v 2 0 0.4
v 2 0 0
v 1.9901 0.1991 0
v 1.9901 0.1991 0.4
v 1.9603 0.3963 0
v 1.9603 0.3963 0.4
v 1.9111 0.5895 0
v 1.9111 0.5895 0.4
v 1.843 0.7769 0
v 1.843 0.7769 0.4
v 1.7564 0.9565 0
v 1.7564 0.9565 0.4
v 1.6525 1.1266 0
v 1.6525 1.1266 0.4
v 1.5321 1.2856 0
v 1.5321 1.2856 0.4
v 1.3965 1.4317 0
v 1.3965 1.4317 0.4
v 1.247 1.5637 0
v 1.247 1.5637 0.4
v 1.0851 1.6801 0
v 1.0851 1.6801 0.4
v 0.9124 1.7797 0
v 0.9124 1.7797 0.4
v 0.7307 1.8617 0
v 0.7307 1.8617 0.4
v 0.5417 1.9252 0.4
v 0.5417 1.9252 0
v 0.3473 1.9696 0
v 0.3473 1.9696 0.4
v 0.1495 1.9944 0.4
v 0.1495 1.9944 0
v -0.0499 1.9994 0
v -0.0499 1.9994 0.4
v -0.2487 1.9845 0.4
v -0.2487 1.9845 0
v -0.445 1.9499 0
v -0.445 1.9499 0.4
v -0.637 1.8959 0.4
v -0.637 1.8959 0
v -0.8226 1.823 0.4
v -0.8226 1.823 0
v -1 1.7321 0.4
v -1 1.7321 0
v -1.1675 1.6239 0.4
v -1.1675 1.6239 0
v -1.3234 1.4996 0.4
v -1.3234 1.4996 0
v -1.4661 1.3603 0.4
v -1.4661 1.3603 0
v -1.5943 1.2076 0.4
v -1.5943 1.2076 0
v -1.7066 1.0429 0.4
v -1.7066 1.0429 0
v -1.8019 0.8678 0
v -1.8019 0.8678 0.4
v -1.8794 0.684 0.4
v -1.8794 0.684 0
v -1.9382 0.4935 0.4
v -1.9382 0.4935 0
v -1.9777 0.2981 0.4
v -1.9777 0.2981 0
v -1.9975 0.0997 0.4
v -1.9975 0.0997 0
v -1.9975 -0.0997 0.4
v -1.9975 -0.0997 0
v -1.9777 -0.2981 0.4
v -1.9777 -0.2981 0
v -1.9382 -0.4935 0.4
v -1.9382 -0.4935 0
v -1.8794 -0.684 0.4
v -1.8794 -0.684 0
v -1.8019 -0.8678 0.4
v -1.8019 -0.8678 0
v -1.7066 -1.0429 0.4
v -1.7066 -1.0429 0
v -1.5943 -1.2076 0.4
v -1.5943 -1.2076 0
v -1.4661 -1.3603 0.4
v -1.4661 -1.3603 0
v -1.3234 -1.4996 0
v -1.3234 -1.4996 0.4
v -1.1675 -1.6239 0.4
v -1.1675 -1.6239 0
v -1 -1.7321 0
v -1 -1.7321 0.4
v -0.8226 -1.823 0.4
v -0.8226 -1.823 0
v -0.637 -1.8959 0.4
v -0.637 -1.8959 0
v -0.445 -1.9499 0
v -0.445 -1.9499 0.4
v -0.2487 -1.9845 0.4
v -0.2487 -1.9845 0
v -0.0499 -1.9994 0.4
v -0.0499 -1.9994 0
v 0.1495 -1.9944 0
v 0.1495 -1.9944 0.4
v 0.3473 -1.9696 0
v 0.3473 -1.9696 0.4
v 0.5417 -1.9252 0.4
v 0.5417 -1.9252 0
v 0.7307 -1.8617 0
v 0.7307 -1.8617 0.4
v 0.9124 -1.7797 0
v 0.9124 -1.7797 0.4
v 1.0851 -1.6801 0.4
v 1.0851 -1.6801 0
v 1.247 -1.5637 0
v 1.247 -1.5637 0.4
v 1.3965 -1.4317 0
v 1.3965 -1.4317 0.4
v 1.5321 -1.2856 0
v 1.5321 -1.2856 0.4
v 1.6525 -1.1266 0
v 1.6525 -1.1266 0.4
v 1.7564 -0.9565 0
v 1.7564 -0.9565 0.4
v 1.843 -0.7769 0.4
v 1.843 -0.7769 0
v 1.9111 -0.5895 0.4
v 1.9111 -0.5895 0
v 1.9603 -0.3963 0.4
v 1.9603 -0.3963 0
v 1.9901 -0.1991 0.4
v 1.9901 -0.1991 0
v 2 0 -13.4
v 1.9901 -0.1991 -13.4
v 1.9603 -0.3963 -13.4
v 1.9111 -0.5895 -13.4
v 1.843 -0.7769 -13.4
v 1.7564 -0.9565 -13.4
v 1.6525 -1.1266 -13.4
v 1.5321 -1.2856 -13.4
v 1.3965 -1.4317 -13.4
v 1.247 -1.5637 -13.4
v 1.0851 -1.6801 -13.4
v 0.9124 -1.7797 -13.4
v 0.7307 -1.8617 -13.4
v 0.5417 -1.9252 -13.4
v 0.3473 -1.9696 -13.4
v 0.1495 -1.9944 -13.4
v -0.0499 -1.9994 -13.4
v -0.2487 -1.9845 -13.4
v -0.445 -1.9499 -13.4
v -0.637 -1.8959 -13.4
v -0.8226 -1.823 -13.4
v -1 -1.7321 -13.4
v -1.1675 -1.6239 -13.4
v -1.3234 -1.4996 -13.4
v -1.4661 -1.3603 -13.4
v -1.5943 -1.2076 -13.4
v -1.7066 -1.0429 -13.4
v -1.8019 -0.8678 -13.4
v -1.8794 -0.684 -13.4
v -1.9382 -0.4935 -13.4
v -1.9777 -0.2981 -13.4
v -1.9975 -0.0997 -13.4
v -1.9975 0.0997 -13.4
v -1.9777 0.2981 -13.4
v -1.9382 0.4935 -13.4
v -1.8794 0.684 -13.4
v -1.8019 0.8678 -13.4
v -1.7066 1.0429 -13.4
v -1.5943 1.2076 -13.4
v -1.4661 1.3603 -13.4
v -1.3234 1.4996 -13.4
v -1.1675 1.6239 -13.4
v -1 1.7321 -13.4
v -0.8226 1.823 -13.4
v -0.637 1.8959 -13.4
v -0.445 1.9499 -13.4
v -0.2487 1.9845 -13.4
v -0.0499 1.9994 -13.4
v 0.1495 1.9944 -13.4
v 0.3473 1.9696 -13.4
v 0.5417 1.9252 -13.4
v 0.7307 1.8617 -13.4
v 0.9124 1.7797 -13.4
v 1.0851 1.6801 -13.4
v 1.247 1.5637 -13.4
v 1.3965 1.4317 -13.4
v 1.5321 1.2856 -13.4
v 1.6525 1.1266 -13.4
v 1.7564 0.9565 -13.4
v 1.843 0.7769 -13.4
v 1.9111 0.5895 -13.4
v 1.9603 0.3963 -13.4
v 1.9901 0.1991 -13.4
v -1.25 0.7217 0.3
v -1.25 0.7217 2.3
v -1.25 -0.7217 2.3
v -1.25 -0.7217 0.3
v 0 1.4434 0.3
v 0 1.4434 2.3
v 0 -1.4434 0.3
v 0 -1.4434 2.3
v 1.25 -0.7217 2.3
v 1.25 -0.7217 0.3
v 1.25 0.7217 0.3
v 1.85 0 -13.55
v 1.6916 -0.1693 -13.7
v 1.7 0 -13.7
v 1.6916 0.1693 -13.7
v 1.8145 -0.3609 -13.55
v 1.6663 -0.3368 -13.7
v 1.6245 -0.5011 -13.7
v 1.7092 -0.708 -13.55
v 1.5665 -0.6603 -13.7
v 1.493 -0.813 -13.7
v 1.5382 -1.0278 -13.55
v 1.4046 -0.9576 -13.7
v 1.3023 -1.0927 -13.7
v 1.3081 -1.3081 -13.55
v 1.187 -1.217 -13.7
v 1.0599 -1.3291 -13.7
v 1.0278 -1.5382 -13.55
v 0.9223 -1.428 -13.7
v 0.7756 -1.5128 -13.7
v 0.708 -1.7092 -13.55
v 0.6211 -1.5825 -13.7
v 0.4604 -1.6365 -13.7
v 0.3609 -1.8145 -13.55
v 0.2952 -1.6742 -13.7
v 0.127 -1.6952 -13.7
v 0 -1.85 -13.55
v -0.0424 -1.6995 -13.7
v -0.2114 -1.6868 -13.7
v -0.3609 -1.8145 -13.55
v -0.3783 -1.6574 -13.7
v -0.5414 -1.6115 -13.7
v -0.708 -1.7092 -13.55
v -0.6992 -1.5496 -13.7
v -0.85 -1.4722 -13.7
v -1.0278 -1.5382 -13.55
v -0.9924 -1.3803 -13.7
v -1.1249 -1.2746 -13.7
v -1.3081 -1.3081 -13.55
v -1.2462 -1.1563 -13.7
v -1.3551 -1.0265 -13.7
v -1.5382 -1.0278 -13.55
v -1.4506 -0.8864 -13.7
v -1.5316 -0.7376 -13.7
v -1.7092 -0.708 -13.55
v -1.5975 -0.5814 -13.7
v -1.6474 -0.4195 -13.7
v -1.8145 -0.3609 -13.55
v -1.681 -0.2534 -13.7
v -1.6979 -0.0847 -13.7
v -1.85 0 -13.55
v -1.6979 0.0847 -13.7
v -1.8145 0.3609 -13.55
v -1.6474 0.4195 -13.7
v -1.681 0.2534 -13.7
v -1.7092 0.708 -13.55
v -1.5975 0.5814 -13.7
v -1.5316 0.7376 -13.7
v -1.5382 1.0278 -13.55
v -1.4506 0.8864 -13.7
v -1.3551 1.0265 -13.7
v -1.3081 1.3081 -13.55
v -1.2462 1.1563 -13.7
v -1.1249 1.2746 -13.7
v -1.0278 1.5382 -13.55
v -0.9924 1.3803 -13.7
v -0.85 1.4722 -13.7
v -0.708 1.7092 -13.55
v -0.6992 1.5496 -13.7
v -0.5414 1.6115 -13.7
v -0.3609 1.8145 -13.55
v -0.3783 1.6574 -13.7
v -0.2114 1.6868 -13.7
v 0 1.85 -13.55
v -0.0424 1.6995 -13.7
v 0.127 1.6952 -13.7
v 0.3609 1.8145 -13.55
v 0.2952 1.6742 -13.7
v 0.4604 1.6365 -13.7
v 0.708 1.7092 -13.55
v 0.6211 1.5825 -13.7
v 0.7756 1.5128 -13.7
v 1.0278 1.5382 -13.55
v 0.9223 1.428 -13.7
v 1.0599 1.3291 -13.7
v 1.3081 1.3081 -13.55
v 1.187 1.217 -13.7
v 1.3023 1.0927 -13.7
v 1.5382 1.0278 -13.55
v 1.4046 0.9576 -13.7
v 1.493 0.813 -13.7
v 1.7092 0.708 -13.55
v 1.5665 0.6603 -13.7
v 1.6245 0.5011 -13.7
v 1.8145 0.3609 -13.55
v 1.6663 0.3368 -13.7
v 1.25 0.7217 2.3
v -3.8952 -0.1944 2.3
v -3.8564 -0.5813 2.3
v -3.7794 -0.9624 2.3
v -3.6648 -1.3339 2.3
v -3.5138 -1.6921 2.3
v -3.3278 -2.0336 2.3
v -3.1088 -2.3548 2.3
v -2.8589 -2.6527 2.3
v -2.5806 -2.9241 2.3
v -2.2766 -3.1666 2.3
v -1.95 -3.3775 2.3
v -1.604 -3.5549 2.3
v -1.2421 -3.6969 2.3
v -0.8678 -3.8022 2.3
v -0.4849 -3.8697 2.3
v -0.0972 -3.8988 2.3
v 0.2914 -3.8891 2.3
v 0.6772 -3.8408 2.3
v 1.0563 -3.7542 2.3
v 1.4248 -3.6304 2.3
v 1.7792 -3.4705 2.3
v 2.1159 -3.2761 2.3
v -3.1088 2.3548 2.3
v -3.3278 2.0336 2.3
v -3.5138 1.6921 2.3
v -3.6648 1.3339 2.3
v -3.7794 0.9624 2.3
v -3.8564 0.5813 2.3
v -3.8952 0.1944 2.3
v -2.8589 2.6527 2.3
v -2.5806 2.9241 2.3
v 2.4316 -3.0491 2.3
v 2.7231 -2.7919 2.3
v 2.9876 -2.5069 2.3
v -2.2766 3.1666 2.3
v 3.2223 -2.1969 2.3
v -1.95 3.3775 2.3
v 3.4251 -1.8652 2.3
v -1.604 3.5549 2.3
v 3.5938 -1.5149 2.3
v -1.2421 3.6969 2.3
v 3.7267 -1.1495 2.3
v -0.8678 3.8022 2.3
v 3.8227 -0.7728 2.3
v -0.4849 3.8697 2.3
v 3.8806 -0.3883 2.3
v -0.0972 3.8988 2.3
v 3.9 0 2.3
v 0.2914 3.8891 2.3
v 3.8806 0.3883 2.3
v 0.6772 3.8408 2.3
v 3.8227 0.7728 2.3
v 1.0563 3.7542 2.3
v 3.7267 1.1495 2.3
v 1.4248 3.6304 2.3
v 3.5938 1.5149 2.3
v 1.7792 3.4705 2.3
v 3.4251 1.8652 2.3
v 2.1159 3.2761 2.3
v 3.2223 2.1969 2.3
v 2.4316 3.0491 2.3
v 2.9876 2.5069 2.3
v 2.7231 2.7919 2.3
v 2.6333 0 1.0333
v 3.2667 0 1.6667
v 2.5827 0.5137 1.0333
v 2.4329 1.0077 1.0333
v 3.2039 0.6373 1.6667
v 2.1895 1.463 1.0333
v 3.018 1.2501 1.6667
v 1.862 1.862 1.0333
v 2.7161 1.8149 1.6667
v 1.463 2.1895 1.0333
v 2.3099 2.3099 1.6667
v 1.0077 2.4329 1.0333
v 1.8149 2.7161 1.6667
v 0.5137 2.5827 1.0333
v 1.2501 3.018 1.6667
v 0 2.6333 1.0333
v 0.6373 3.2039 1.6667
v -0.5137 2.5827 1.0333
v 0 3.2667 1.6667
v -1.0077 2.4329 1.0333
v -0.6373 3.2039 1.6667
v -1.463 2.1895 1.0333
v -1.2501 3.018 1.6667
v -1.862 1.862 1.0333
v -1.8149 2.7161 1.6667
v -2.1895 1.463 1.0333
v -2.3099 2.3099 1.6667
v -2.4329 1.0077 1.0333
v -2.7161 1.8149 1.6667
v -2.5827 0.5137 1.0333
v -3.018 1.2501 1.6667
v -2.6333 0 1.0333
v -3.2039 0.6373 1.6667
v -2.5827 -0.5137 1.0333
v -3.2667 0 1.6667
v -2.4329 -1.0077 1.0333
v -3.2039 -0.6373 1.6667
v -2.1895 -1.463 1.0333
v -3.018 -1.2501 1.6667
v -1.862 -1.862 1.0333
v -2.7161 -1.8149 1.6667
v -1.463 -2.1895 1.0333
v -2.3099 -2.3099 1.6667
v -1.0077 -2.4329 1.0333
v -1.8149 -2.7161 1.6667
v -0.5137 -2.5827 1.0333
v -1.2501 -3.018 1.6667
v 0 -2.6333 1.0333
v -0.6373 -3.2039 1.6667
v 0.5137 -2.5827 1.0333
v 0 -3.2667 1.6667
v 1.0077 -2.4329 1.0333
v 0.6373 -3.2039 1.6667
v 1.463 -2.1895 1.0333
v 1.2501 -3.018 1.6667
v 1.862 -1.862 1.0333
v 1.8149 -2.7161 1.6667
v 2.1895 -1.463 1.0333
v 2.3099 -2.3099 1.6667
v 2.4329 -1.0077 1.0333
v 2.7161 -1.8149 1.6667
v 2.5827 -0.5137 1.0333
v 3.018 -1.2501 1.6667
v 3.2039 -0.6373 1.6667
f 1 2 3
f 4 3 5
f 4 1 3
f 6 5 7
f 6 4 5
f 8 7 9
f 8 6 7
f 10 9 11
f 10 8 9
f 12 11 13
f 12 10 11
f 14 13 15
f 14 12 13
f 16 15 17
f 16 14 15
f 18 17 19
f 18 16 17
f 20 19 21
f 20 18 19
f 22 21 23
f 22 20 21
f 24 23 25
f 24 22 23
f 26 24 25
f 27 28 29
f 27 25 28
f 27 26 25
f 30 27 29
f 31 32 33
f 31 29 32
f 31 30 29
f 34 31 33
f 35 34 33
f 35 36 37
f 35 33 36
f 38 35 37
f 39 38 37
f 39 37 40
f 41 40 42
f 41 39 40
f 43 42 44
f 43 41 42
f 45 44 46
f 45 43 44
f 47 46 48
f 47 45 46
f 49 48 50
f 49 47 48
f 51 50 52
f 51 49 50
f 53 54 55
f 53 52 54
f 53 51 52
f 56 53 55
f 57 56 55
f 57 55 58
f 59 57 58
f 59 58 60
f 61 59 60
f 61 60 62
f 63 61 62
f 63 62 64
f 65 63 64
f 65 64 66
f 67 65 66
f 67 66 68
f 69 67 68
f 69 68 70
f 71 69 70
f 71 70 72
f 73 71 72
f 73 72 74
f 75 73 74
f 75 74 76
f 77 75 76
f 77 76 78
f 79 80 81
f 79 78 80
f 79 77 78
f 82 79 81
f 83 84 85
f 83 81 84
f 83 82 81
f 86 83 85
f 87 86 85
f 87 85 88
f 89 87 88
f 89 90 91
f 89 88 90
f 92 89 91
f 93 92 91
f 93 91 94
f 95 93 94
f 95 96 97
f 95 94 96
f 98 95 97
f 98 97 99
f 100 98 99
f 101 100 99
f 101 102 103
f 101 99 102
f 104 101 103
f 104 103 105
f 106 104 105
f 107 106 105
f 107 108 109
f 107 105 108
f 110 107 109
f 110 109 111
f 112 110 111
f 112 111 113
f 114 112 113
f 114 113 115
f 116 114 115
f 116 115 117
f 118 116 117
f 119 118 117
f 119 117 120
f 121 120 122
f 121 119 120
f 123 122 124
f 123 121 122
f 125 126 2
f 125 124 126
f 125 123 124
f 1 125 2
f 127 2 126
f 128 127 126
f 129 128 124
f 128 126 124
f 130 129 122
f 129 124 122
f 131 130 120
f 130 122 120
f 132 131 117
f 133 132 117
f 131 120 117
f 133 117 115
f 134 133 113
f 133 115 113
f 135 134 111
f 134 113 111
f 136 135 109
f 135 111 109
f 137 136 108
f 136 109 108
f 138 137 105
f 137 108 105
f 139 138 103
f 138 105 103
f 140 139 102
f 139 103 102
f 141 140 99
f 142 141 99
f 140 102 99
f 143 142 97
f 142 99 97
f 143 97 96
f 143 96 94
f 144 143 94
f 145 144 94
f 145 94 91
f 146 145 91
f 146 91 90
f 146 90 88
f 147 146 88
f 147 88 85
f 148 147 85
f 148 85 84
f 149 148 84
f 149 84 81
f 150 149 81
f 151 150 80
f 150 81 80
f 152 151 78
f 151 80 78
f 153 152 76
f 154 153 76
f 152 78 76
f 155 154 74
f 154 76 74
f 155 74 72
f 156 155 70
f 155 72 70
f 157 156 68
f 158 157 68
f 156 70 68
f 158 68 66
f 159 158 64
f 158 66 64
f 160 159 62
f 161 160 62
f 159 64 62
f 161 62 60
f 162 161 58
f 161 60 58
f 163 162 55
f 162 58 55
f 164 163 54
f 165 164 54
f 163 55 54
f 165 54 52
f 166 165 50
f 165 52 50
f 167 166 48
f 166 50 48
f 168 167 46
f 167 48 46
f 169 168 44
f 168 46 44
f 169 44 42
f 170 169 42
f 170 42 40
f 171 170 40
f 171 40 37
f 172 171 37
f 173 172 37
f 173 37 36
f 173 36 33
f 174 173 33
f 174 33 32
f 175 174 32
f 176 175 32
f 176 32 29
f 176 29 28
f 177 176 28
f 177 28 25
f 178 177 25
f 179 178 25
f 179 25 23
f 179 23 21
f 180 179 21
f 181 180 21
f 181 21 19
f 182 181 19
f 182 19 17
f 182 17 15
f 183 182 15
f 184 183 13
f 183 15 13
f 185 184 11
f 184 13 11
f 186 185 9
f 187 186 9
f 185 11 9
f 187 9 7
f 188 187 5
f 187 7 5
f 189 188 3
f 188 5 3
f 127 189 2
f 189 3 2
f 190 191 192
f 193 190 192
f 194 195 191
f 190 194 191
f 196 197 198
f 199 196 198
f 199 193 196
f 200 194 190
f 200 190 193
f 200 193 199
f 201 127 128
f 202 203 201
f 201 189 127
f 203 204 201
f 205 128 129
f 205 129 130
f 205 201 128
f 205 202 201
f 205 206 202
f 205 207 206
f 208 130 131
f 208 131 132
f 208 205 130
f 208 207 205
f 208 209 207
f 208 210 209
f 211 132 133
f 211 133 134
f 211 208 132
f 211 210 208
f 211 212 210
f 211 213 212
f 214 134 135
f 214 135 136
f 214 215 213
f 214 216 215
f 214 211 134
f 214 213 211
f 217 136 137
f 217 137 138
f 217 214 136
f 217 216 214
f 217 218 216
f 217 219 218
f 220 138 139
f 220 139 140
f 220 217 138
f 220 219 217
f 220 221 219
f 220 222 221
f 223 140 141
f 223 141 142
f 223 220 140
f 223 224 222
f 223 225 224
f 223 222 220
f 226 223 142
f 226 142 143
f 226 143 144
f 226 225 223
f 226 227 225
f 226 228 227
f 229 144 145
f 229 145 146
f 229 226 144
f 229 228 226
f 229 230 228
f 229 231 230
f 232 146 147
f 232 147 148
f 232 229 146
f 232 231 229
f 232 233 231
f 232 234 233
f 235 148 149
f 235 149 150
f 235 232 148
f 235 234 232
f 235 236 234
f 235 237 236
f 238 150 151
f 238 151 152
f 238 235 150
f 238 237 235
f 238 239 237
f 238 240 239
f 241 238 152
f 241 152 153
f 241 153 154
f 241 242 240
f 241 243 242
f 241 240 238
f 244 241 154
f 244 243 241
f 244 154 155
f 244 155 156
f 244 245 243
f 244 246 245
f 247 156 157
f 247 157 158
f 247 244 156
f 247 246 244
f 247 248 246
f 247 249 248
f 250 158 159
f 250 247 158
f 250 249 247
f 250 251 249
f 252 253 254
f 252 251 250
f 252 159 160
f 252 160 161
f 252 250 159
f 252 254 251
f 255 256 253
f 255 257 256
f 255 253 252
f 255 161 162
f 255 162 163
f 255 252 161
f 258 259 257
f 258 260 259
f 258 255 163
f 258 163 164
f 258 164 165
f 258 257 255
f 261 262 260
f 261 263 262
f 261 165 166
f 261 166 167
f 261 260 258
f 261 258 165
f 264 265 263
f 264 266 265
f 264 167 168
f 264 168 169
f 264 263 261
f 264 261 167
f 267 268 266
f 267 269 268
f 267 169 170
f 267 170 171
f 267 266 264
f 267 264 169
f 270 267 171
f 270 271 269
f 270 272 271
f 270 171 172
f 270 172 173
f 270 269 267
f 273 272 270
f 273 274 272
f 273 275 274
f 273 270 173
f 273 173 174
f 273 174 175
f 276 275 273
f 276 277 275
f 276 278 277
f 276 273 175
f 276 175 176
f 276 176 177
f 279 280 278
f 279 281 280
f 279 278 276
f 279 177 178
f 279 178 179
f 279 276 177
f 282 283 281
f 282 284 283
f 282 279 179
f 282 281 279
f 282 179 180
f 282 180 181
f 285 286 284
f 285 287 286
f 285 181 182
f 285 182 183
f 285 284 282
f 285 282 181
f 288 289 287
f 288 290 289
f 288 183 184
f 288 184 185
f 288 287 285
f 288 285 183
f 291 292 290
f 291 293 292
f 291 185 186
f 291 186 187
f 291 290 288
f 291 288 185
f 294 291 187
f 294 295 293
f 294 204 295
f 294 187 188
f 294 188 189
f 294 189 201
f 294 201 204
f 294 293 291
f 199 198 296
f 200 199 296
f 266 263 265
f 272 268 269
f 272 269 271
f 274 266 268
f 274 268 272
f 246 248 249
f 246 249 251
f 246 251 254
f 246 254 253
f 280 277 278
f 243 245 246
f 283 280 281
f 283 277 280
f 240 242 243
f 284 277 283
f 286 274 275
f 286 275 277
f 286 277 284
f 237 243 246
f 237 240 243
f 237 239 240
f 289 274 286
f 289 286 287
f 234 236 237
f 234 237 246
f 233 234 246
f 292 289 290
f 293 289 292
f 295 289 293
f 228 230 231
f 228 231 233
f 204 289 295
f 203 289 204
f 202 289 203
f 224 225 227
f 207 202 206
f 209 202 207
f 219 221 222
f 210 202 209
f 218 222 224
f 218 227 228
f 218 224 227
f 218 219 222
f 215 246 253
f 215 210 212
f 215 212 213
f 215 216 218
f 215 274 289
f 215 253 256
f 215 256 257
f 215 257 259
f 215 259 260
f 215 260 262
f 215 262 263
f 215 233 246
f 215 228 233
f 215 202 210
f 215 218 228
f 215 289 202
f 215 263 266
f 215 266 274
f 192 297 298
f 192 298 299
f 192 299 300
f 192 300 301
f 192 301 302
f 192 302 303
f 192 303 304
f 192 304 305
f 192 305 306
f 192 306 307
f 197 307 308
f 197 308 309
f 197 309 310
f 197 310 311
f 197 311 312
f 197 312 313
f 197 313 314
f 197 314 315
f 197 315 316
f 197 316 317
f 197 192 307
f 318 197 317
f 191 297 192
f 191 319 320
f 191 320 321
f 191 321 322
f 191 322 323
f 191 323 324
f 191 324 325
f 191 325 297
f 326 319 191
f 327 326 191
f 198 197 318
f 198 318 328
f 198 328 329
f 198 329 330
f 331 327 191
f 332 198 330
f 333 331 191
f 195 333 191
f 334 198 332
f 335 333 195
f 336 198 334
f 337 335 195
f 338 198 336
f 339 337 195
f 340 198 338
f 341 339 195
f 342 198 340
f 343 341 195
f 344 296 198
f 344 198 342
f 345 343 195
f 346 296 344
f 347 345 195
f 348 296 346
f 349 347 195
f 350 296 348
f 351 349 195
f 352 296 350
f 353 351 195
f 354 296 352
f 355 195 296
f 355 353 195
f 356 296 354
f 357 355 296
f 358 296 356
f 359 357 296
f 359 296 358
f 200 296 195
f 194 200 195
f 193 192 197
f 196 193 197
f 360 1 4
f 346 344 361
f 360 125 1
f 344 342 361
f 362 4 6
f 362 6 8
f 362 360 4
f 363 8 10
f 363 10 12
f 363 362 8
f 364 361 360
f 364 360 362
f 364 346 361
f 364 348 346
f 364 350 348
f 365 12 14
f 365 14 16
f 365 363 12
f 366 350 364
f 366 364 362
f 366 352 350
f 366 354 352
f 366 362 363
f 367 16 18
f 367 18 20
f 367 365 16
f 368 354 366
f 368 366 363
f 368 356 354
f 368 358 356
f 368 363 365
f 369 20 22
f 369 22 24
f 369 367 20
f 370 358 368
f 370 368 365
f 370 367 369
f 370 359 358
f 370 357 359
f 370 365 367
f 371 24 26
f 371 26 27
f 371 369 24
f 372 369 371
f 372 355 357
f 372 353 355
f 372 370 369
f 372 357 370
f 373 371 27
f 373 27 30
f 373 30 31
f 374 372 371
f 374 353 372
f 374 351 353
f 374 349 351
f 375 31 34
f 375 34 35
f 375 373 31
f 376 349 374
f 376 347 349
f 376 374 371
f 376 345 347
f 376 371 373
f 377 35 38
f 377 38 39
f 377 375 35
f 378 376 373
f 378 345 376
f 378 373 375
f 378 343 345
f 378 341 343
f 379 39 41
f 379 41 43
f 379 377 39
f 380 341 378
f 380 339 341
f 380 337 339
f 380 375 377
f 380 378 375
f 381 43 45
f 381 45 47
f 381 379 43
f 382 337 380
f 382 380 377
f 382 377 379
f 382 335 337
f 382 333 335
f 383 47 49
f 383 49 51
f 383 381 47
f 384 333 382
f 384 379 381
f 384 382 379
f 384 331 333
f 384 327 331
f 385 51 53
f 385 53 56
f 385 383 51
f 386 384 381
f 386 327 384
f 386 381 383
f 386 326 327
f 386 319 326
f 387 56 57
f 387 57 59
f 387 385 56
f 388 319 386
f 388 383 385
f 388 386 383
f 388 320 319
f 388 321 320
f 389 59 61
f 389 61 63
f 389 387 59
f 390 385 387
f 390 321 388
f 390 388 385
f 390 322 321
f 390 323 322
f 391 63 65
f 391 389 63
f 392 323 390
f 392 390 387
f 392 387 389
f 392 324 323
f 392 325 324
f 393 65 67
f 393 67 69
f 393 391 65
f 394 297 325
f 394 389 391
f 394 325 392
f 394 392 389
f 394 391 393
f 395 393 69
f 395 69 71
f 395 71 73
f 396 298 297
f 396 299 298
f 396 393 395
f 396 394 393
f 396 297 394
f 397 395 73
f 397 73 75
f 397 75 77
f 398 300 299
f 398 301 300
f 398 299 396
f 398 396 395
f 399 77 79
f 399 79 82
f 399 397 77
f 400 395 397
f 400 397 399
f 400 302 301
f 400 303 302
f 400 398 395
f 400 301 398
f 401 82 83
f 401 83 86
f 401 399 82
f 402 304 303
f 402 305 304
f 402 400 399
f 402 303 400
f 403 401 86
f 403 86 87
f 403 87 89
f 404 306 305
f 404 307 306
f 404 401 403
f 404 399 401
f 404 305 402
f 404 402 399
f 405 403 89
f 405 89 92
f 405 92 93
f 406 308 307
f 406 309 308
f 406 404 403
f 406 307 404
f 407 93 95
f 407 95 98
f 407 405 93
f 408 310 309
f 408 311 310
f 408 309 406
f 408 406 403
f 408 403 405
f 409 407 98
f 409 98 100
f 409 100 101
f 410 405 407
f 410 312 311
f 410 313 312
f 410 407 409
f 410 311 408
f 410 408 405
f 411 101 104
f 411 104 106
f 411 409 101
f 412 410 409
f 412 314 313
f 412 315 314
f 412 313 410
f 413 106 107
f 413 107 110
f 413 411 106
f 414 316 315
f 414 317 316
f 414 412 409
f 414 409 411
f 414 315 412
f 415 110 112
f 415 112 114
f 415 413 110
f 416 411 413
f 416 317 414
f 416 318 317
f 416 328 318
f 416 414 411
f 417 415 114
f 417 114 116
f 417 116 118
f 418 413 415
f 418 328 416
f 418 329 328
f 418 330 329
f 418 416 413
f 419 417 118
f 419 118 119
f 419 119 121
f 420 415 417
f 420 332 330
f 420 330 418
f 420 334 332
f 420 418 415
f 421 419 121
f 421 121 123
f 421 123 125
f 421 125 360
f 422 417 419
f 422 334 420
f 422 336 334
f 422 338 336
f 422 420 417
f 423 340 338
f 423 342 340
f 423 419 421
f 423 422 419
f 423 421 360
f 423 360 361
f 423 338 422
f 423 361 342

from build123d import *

# Parameters (mm, degrees)
SKETCH1_R           = 4
BOSS_EXTRUDE1_DEPTH = 2.3
SKETCH2_R           = 2
BOSS_EXTRUDE2_DEPTH = 13.7
CHAMFER1_SIZE       = 0.3
CUT_EXTRUDE1_DEPTH  = 2
CHAMFER2_SIZE       = 2.4


with BuildPart() as part:
    # Sketch1 → Boss-Extrude1 (new body)
    with BuildSketch(Plane.XY):
        Circle(SKETCH1_R)
    extrude(amount=BOSS_EXTRUDE1_DEPTH)

    # Sketch2 → Boss-Extrude2 (add)
    with BuildSketch(Plane(origin=(0, 0, 0), x_dir=(-1, 0, 0), z_dir=(0, 0, -1))):
        with Locations(Location((0, 0, 0), (0, 0, 180))):
            Circle(SKETCH2_R)
    extrude(amount=BOSS_EXTRUDE2_DEPTH)

    # Chamfer1
    chamfer1_edges = [part.edges().sort_by_distance(p)[0] for p in [
        (-2, 0, -13.7),
    ]]
    chamfer(chamfer1_edges, length=CHAMFER1_SIZE)

    # Sketch3 → Cut-Extrude1 (cut)
    with BuildSketch(Plane.XY.offset(2.3)):
        Polygon((0, 1.443375673), (-1.25, 0.721687836), (-1.25, -0.721687836), (0, -1.443375673), (1.25, -0.721687836), (1.25, 0.721687836), align=None)
    extrude(amount=-CUT_EXTRUDE1_DEPTH, mode=Mode.SUBTRACT)

    # Chamfer2
    # the kernel refuses this chamfer: 2.4 mm, written as the material it takes off along each edge
    with BuildSketch(Plane(origin=(0, 0, 0), x_dir=(1, 0, 0), z_dir=(0, -1, 0))) as chamfer2_piece_1_section:
        Polygon((4 - CHAMFER2_SIZE, 0), (4, CHAMFER2_SIZE), (4, 0), align=None)
    chamfer2_piece_1 = revolve(axis=Axis((0, 0, 0), (0, 0, 1)), mode=Mode.PRIVATE)
    chamfer2_piece_1 = chamfer2_piece_1 - Plane(origin=(0, 0, 1.405884102), x_dir=(1, 0, 0), z_dir=(0, 0, 1)) * Cylinder(2, 16, mode=Mode.PRIVATE)
    add(chamfer2_piece_1, mode=Mode.SUBTRACT)


solid = part.part
